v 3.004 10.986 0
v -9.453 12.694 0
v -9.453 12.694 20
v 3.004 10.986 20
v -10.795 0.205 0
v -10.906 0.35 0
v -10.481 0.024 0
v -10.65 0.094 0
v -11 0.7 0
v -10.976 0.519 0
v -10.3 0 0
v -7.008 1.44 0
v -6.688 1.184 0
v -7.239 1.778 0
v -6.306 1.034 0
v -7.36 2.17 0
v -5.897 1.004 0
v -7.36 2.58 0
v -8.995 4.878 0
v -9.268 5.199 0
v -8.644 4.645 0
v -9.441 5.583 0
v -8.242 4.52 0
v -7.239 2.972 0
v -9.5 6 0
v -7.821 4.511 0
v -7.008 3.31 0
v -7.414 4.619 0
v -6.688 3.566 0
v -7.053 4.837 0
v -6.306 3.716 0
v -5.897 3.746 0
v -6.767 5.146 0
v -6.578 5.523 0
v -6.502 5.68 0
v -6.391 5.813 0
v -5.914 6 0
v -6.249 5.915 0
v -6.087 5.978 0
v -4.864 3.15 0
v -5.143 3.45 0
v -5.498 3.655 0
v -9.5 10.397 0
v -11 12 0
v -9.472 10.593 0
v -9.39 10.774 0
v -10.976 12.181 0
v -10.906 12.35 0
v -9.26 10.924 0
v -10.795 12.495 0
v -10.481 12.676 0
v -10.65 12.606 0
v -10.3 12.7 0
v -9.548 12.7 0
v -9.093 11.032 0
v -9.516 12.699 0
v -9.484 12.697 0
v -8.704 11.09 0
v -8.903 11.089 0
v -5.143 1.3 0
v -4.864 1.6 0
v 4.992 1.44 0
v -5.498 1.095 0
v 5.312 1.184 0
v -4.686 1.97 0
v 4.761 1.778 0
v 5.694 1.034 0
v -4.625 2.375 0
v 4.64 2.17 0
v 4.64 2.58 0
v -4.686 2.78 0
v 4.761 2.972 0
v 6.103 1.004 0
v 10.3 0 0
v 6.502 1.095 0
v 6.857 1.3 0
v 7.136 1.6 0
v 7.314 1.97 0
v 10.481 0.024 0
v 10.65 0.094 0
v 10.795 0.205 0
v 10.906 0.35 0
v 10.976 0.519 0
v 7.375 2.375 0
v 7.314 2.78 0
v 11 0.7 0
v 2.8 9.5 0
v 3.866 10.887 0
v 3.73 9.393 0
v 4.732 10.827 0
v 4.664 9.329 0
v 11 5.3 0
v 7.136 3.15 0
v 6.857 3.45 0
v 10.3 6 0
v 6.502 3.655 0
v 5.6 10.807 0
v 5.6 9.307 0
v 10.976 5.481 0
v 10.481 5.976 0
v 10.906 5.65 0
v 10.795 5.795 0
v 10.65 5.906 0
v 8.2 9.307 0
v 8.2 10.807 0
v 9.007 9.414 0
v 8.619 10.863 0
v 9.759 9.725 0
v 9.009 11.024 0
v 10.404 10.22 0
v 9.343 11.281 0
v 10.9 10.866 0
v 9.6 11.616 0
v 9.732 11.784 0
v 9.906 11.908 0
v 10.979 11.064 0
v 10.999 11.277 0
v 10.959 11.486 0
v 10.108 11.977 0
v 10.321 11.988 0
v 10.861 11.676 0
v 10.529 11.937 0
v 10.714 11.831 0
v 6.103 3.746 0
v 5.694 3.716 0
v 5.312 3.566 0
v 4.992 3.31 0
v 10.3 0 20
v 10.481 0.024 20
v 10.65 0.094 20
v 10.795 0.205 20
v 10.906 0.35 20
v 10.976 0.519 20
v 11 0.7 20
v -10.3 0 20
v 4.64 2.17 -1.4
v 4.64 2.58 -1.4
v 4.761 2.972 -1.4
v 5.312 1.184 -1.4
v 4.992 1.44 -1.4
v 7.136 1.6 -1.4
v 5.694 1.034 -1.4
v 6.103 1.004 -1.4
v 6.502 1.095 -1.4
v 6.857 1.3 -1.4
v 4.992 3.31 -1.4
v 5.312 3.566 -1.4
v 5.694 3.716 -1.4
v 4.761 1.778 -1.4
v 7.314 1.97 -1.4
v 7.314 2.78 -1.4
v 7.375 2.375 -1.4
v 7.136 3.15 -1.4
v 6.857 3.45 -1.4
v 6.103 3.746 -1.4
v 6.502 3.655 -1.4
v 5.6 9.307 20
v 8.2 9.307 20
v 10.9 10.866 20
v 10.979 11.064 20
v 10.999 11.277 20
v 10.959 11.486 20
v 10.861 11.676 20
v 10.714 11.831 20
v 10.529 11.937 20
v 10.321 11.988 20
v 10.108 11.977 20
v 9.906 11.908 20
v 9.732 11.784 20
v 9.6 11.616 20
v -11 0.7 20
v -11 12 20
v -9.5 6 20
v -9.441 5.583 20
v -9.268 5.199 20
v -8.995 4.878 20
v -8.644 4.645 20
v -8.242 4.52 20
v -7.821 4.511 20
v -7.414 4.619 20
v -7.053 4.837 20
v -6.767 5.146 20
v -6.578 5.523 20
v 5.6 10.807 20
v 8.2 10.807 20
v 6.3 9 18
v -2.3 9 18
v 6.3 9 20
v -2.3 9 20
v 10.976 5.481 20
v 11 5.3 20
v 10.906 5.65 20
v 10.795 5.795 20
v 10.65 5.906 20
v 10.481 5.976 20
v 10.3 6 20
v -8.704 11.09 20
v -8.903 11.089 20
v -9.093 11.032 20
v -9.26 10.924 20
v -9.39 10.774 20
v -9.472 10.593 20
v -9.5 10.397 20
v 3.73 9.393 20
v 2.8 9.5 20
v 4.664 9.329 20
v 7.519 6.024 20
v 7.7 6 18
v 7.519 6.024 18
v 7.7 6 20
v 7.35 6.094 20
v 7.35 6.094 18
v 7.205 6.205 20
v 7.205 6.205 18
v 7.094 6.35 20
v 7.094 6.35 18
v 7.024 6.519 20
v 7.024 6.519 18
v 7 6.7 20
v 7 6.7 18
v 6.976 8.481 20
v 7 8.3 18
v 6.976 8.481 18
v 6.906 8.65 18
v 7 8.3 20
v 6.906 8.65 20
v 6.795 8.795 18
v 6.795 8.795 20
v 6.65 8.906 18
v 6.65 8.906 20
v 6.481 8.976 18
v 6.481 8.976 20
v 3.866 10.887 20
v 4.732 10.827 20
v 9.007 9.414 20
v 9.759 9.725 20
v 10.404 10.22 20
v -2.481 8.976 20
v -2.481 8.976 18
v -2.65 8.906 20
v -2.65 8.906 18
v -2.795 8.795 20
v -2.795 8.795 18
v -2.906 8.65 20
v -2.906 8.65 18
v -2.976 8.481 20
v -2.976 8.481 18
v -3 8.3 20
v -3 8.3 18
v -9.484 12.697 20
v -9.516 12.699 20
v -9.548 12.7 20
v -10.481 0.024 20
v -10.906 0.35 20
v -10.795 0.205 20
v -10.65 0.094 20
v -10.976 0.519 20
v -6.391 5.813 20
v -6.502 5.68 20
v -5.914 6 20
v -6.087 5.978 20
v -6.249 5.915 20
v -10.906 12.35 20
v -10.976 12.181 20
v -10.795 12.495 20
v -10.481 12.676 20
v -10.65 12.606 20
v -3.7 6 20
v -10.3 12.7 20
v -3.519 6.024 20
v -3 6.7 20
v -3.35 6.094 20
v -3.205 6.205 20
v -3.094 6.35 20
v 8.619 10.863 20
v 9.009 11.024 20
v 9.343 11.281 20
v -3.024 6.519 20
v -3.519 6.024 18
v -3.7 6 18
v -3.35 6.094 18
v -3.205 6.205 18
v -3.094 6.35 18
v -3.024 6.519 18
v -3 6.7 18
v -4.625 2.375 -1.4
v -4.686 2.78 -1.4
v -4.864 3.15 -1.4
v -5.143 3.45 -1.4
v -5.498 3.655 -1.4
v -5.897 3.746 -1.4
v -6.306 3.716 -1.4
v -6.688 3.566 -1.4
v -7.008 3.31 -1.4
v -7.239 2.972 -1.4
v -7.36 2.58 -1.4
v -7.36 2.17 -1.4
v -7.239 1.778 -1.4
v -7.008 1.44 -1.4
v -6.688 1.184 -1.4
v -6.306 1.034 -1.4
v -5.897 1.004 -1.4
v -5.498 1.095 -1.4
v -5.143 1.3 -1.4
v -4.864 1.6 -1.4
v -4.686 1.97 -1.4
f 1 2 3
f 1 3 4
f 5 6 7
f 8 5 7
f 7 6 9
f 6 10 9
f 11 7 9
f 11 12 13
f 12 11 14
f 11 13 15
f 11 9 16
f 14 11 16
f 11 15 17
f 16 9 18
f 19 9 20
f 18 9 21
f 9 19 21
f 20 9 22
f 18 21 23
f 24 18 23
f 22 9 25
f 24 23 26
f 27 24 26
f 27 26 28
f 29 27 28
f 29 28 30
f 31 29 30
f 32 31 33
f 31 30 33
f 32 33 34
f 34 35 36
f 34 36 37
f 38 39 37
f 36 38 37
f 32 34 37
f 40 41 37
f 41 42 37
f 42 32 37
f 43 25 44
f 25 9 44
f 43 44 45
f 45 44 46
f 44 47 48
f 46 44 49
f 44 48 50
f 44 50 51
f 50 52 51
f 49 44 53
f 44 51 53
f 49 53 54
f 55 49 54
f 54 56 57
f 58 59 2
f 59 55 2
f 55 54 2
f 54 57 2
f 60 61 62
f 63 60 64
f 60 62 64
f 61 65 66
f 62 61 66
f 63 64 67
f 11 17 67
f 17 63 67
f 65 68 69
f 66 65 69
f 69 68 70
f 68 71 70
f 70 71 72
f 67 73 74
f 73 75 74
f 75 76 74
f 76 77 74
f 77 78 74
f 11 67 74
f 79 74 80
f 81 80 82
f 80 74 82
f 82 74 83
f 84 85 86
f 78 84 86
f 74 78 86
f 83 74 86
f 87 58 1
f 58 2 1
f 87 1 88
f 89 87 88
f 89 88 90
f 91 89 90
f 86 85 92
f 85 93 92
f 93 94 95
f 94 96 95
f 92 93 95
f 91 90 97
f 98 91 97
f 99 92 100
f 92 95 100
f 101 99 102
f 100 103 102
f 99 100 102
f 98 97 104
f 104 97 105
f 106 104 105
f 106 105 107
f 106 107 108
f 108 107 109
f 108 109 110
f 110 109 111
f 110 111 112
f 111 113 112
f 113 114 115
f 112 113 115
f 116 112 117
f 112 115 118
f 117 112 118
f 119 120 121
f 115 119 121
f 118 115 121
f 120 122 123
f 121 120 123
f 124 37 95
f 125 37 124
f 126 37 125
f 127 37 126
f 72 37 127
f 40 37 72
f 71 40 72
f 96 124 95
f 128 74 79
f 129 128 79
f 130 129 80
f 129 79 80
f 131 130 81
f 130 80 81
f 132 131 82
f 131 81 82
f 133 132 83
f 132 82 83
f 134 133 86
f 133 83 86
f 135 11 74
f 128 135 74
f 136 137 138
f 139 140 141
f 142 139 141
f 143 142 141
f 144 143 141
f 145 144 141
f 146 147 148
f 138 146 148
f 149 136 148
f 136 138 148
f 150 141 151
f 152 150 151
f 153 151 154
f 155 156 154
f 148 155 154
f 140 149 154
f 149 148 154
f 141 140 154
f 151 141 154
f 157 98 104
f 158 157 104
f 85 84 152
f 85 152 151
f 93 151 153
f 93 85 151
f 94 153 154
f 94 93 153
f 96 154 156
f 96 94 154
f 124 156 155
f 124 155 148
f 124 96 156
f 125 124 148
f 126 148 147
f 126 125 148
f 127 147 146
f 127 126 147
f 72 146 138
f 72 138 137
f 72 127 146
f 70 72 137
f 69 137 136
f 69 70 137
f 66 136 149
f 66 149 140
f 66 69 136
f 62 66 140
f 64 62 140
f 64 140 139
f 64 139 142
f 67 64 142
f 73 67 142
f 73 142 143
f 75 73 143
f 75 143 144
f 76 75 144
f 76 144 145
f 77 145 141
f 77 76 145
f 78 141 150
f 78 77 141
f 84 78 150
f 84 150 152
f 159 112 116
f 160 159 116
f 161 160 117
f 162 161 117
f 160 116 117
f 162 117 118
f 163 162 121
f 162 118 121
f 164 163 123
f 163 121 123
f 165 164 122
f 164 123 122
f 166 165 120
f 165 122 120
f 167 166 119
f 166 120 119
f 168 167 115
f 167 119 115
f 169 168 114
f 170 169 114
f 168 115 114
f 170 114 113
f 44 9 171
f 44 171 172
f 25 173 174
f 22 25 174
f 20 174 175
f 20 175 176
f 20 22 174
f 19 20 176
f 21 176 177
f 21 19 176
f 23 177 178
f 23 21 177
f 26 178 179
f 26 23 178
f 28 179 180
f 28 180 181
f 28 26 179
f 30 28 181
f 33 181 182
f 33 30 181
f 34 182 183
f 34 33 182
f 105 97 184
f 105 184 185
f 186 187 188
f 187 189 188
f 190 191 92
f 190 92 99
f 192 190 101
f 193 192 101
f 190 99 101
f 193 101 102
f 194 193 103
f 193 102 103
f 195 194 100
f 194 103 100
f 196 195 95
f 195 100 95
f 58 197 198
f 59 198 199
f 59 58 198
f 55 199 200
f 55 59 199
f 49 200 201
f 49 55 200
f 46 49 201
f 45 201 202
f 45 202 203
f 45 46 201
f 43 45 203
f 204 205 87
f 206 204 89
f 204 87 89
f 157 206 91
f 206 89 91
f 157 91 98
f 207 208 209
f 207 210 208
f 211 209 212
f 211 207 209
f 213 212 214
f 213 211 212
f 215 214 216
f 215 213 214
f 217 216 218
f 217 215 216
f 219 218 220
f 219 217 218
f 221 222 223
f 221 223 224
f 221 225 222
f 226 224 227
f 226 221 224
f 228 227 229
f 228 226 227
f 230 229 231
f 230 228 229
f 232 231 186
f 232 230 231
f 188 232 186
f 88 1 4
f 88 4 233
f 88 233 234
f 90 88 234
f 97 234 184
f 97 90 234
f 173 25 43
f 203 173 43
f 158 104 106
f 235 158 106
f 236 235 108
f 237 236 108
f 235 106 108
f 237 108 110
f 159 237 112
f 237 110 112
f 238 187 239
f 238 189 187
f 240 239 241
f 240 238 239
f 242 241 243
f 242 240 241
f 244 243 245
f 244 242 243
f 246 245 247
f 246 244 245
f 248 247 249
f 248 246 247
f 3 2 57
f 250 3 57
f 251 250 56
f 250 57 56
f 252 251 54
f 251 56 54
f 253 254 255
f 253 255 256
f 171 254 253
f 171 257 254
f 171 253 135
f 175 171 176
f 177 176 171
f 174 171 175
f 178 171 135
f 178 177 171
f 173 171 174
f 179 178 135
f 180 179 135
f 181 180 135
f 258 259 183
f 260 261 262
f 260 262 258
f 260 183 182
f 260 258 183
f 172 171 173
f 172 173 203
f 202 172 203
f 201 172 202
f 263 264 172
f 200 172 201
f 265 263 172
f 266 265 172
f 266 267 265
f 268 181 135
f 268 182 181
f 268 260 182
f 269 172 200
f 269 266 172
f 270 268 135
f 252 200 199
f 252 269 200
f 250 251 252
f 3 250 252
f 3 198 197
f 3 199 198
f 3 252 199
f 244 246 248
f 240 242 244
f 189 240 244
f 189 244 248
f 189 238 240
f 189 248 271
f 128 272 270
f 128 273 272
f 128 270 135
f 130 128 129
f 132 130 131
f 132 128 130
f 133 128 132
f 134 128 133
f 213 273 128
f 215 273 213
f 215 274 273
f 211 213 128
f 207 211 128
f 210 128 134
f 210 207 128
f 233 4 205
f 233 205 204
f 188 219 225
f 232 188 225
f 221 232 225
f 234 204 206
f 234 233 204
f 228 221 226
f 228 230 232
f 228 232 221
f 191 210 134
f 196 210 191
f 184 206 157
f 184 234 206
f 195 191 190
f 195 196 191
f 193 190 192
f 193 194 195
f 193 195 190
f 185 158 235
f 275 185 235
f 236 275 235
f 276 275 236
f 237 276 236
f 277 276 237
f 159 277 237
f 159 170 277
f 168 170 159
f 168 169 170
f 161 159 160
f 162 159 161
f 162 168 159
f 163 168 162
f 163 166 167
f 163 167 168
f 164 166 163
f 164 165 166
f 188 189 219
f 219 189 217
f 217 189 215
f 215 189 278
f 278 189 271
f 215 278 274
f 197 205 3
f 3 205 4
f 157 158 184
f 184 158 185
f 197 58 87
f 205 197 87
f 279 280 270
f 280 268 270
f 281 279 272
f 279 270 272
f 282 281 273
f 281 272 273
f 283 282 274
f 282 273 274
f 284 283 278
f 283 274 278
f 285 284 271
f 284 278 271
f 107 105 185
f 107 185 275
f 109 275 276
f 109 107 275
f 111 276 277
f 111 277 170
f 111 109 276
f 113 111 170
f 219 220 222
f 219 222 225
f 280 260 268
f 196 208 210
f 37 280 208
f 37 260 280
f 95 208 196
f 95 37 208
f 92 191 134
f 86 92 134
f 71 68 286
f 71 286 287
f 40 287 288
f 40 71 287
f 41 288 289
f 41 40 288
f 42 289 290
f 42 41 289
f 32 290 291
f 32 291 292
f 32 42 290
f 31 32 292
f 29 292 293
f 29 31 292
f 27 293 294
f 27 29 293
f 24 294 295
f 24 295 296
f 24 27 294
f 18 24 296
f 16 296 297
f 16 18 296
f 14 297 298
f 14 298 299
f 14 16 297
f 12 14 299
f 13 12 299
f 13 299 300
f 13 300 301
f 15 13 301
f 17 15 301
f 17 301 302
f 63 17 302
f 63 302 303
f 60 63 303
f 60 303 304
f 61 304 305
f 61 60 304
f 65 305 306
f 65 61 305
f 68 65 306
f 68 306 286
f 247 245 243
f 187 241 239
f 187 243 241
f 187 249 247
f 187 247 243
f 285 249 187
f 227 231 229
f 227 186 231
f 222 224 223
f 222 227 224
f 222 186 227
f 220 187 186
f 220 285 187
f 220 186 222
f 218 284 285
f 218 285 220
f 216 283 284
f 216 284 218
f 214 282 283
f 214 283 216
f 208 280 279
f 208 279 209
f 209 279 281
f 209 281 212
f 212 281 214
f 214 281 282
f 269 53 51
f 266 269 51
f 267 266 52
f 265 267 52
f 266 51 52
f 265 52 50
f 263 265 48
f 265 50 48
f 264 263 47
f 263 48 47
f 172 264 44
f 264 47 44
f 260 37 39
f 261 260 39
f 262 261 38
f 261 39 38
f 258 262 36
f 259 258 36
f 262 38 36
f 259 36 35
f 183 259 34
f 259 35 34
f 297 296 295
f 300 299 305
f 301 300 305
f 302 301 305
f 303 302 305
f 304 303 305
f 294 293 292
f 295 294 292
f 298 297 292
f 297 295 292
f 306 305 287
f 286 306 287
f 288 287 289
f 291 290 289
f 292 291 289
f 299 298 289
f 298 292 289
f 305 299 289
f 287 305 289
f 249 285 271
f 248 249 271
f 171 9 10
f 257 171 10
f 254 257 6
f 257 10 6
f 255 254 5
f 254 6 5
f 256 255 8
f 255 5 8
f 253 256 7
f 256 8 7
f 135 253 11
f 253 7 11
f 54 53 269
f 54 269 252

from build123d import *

# Parameters (mm, degrees)
PAD_DEPTH    = 20
SKETCH001_W  = 10
SKETCH001_H  = 2
PAD001_DEPTH = 3
SKETCH002_R  = 1.375
PAD002_DEPTH = 1.4
FILLET_R     = 0.7


with BuildPart() as part:
    # Sketch → Pad (new body)
    with BuildSketch(Plane.XY):
        with BuildLine():
            Line((-10.3, 0), (10.3, 0))
            ThreePointArc((10.3, 0), (10.794975, 0.205025), (11, 0.7))
            Line((11, 5.3), (11, 0.7))
            ThreePointArc((11, 5.3), (10.794975, 5.794975), (10.3, 6))
            Line((-5.914335, 6), (10.3, 6))
            ThreePointArc((-5.914335, 6), (-6.323047, 5.868291), (-6.577955, 5.522727))
            ThreePointArc((-9.5, 6), (-8.241799, 4.519617), (-6.577955, 5.522727))
            Line((-9.5, 6), (-9.5, 10.396598))
            ThreePointArc((-8.704163, 11.090006), (-9.259845, 10.924369), (-9.5, 10.396598))
            Line((-8.704163, 11.090006), (2.8, 9.5))
            ThreePointArc((2.8, 9.5), (4.196693, 9.355621), (5.6, 9.307419))
            Line((5.6, 9.307419), (8.2, 9.307419))
            ThreePointArc((8.2, 9.307419), (9.758568, 9.725036), (10.899519, 10.865987))
            ThreePointArc((10.899519, 10.865987), (10.625, 11.890506), (9.600482, 11.615987))
            ThreePointArc((8.2, 10.807418), (9.008569, 11.024074), (9.600482, 11.615987))
            Line((5.6, 10.807418), (8.2, 10.807418))
            ThreePointArc((3.003702, 10.986104), (4.29878, 10.852143), (5.6, 10.807418))
            Line((-9.452691, 12.693515), (3.003702, 10.986104))
            ThreePointArc((-9.452691, 12.693515), (-9.500111, 12.698377), (-9.547752, 12.7))
            Line((-10.3, 12.7), (-9.547752, 12.7))
            ThreePointArc((-10.3, 12.7), (-10.794975, 12.494975), (-11, 12))
            Line((-11, 6), (-11, 12))
            Line((-11, 0.7), (-11, 6))
            ThreePointArc((-11, 0.7), (-10.794975, 0.205025), (-10.3, 0))
        make_face()
    extrude(amount=PAD_DEPTH)

    # Sketch001 (on DatumPlane) → Pad001 (join)
    with BuildSketch(Plane.XZ.offset(-6)):
        with Locations((2, 19)):
            Rectangle(SKETCH001_W, SKETCH001_H)
    extrude(amount=-PAD001_DEPTH)

    # Sketch002 → Pad002 (join)
    with BuildSketch(Plane.XY):
        with Locations((6, 2.375)):
            Circle(SKETCH002_R)
        with Locations((-6, 2.375)):
            Circle(SKETCH002_R)
    extrude(amount=-PAD002_DEPTH)

    # Fillet
    fillet_edges = [part.edges().sort_by_distance(p)[0] for p in [
        (-3, 9, 19),
        (-3, 6, 19),
        (7, 9, 19),
        (7, 6, 19),
    ]]
    fillet(fillet_edges, radius=FILLET_R)


solid = part.part
